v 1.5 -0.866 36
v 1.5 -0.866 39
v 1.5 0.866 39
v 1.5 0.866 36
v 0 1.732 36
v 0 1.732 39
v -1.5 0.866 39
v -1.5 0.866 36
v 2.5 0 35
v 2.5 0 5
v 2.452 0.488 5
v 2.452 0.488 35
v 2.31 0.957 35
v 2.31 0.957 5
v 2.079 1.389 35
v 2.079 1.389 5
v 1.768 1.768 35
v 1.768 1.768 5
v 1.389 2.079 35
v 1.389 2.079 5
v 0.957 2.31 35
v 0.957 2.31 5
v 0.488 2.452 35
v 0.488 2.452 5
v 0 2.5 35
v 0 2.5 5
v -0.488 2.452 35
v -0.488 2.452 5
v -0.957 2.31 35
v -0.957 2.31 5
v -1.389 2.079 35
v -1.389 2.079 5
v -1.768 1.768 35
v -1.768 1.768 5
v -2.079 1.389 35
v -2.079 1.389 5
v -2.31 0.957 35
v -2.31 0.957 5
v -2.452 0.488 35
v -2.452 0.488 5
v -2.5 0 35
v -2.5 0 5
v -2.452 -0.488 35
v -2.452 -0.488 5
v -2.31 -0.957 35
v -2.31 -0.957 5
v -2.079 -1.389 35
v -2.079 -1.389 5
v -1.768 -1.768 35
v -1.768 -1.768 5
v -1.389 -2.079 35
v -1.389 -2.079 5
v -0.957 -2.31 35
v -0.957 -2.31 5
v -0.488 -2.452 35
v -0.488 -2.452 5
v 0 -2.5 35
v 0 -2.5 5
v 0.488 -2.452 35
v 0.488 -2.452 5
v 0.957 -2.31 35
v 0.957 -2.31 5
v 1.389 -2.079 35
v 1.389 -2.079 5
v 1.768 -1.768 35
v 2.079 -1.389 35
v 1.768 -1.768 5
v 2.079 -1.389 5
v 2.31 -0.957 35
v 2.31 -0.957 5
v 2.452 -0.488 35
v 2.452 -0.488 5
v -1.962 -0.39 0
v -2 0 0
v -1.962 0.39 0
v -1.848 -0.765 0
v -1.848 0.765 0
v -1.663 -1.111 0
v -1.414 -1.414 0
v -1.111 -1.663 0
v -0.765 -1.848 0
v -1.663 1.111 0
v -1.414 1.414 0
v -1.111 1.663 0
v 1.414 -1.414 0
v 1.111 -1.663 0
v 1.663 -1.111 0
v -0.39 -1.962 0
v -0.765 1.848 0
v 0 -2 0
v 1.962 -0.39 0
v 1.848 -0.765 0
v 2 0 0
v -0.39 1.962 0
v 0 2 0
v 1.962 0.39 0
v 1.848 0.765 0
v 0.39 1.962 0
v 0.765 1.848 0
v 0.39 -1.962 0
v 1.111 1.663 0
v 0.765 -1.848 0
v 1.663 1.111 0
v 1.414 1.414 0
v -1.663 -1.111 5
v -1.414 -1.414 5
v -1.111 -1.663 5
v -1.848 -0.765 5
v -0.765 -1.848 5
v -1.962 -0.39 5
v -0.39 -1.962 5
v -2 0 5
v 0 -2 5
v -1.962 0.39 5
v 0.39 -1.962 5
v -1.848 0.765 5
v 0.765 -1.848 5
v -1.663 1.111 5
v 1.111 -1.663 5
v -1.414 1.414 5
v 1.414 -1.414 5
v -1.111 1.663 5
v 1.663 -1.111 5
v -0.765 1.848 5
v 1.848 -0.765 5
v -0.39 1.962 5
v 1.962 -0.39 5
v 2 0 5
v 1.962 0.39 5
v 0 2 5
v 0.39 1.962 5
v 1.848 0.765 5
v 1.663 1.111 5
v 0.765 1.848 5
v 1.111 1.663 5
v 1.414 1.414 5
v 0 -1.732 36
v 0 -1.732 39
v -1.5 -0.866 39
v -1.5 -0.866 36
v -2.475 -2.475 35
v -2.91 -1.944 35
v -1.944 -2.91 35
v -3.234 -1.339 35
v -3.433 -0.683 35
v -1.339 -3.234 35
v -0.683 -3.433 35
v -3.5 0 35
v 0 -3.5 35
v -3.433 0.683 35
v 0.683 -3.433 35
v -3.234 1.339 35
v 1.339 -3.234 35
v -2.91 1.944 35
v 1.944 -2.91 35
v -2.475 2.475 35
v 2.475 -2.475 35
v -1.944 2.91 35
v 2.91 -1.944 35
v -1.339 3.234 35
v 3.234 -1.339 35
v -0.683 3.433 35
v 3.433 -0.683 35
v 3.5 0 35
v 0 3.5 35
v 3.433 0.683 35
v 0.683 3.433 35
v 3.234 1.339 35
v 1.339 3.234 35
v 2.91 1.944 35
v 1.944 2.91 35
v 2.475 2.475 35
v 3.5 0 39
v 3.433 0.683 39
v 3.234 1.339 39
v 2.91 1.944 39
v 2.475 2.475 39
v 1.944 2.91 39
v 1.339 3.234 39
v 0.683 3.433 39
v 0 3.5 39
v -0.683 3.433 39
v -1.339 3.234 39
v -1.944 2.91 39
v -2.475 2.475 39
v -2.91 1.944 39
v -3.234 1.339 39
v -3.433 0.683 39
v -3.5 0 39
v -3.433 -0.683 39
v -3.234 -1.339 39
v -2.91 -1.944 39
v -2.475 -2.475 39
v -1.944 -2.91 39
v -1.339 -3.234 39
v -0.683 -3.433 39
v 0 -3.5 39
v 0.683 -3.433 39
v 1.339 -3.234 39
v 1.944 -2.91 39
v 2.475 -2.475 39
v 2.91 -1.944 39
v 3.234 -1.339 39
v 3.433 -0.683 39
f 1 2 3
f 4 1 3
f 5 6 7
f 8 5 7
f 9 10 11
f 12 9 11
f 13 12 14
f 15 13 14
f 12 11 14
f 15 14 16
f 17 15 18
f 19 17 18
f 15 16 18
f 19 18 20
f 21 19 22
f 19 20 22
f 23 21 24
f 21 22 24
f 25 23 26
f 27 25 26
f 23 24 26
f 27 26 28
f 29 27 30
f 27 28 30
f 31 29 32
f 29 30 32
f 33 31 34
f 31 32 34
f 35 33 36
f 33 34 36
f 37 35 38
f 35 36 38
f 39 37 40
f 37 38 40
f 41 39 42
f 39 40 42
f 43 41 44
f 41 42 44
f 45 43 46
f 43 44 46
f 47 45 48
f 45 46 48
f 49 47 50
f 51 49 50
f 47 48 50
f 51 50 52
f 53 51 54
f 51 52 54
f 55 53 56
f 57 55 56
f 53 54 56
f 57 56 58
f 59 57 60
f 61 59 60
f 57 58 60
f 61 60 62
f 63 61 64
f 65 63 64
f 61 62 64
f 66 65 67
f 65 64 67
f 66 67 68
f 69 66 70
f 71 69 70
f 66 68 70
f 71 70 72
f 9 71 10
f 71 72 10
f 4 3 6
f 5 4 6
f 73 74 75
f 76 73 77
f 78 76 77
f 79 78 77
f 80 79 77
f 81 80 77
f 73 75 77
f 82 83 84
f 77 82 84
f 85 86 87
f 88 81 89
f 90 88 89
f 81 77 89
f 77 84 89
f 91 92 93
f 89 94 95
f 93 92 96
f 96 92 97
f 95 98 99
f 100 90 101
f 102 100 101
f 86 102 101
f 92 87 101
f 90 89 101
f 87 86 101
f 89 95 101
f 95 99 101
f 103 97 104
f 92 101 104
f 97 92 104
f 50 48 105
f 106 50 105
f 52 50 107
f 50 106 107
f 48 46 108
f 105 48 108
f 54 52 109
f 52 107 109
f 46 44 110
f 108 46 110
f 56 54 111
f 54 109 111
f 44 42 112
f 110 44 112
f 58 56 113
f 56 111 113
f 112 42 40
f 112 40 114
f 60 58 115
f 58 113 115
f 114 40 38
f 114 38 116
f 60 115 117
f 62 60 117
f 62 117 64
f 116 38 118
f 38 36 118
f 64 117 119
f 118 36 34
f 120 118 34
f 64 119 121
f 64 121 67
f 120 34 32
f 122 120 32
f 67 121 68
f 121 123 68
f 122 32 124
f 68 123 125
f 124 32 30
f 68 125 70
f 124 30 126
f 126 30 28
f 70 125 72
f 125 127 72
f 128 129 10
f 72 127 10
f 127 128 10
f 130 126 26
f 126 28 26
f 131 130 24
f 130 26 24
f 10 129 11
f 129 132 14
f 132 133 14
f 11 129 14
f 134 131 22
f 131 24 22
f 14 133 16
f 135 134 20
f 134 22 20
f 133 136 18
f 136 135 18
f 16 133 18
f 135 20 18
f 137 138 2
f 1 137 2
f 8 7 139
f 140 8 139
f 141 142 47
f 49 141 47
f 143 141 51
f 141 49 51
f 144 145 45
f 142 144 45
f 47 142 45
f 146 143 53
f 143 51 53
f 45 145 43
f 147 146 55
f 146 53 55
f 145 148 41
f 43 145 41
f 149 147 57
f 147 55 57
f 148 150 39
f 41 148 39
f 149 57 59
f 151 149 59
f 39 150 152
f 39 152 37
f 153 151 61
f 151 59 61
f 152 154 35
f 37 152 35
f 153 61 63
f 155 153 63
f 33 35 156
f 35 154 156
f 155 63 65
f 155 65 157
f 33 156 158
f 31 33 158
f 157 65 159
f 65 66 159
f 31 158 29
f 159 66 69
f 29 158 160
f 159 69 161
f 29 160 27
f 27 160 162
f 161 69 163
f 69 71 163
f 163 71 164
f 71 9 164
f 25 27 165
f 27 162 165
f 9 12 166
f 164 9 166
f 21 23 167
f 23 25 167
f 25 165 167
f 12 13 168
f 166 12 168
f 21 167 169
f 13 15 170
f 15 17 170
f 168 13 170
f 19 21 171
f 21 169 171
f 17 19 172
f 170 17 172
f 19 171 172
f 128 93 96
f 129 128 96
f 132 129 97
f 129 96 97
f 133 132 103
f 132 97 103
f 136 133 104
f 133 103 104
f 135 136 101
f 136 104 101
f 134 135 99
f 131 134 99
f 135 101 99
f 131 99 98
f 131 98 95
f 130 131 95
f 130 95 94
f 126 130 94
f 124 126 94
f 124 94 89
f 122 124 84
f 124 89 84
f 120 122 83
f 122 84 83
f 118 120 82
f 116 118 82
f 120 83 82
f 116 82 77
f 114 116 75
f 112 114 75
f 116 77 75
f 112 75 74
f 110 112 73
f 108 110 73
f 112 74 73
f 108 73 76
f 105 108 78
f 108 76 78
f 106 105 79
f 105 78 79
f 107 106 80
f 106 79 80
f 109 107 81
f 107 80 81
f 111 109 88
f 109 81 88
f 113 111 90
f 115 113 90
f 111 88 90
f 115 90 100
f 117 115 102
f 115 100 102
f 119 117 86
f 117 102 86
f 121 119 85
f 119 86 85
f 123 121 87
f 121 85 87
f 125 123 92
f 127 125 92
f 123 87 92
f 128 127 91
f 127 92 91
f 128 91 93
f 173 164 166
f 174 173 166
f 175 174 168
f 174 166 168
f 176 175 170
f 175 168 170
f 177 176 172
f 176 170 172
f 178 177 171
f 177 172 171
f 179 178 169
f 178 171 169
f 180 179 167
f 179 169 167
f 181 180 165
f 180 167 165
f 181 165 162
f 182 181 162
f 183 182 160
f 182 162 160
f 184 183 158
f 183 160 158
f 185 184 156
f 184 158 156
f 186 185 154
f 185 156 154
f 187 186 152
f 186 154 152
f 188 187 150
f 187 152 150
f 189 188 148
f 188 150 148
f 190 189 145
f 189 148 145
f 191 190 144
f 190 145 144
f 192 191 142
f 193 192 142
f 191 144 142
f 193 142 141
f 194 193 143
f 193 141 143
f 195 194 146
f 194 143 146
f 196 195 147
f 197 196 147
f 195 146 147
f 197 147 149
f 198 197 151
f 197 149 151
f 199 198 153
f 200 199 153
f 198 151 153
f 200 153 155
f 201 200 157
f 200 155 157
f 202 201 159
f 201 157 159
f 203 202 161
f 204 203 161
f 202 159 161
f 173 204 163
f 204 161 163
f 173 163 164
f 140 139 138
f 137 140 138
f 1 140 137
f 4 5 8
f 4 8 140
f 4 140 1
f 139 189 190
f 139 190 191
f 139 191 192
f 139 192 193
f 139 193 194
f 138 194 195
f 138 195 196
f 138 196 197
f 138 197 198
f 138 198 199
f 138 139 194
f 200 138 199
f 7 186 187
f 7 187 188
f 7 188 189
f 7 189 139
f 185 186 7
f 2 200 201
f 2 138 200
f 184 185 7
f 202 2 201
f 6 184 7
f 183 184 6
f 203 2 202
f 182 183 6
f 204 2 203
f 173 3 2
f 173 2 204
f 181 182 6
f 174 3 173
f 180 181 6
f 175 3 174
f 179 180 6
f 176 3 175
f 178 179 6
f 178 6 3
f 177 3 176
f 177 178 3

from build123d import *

# Parameters (mm, degrees)
SKETCH_1_R          = 2
EXTRUDE_1_DEPTH     = 5
SKETCH_2_R          = 2.5
EXTRUDE_2_DEPTH     = 30
SKETCH_3_R          = 3.5
EXTRUDE_3_DEPTH     = 4
CUT_EXTRUDE_1_DEPTH = 3


with BuildPart() as part:
    # Эскиз1 → Бобышка-Вытянуть1 (new body)
    with BuildSketch(Plane.XY):
        Circle(SKETCH_1_R)
    extrude(amount=EXTRUDE_1_DEPTH)

    # Эскиз2 → Бобышка-Вытянуть2 (add)
    with BuildSketch(Plane.XY.offset(5)):
        Circle(SKETCH_2_R)
    extrude(amount=EXTRUDE_2_DEPTH)

    # Эскиз3 → Бобышка-Вытянуть3 (add)
    with BuildSketch(Plane.XY.offset(35)):
        Circle(SKETCH_3_R)
    extrude(amount=EXTRUDE_3_DEPTH)

    # Эскиз4 → Вырез-Вытянуть1 (cut)
    with BuildSketch(Plane.XY.offset(39)):
        Polygon((1.5, 0.866025404), (0, 1.732050808), (-1.5, 0.866025404), (-1.5, -0.866025404), (0, -1.732050808), (1.5, -0.866025404), align=None)
    extrude(amount=-CUT_EXTRUDE_1_DEPTH, mode=Mode.SUBTRACT)


solid = part.part
